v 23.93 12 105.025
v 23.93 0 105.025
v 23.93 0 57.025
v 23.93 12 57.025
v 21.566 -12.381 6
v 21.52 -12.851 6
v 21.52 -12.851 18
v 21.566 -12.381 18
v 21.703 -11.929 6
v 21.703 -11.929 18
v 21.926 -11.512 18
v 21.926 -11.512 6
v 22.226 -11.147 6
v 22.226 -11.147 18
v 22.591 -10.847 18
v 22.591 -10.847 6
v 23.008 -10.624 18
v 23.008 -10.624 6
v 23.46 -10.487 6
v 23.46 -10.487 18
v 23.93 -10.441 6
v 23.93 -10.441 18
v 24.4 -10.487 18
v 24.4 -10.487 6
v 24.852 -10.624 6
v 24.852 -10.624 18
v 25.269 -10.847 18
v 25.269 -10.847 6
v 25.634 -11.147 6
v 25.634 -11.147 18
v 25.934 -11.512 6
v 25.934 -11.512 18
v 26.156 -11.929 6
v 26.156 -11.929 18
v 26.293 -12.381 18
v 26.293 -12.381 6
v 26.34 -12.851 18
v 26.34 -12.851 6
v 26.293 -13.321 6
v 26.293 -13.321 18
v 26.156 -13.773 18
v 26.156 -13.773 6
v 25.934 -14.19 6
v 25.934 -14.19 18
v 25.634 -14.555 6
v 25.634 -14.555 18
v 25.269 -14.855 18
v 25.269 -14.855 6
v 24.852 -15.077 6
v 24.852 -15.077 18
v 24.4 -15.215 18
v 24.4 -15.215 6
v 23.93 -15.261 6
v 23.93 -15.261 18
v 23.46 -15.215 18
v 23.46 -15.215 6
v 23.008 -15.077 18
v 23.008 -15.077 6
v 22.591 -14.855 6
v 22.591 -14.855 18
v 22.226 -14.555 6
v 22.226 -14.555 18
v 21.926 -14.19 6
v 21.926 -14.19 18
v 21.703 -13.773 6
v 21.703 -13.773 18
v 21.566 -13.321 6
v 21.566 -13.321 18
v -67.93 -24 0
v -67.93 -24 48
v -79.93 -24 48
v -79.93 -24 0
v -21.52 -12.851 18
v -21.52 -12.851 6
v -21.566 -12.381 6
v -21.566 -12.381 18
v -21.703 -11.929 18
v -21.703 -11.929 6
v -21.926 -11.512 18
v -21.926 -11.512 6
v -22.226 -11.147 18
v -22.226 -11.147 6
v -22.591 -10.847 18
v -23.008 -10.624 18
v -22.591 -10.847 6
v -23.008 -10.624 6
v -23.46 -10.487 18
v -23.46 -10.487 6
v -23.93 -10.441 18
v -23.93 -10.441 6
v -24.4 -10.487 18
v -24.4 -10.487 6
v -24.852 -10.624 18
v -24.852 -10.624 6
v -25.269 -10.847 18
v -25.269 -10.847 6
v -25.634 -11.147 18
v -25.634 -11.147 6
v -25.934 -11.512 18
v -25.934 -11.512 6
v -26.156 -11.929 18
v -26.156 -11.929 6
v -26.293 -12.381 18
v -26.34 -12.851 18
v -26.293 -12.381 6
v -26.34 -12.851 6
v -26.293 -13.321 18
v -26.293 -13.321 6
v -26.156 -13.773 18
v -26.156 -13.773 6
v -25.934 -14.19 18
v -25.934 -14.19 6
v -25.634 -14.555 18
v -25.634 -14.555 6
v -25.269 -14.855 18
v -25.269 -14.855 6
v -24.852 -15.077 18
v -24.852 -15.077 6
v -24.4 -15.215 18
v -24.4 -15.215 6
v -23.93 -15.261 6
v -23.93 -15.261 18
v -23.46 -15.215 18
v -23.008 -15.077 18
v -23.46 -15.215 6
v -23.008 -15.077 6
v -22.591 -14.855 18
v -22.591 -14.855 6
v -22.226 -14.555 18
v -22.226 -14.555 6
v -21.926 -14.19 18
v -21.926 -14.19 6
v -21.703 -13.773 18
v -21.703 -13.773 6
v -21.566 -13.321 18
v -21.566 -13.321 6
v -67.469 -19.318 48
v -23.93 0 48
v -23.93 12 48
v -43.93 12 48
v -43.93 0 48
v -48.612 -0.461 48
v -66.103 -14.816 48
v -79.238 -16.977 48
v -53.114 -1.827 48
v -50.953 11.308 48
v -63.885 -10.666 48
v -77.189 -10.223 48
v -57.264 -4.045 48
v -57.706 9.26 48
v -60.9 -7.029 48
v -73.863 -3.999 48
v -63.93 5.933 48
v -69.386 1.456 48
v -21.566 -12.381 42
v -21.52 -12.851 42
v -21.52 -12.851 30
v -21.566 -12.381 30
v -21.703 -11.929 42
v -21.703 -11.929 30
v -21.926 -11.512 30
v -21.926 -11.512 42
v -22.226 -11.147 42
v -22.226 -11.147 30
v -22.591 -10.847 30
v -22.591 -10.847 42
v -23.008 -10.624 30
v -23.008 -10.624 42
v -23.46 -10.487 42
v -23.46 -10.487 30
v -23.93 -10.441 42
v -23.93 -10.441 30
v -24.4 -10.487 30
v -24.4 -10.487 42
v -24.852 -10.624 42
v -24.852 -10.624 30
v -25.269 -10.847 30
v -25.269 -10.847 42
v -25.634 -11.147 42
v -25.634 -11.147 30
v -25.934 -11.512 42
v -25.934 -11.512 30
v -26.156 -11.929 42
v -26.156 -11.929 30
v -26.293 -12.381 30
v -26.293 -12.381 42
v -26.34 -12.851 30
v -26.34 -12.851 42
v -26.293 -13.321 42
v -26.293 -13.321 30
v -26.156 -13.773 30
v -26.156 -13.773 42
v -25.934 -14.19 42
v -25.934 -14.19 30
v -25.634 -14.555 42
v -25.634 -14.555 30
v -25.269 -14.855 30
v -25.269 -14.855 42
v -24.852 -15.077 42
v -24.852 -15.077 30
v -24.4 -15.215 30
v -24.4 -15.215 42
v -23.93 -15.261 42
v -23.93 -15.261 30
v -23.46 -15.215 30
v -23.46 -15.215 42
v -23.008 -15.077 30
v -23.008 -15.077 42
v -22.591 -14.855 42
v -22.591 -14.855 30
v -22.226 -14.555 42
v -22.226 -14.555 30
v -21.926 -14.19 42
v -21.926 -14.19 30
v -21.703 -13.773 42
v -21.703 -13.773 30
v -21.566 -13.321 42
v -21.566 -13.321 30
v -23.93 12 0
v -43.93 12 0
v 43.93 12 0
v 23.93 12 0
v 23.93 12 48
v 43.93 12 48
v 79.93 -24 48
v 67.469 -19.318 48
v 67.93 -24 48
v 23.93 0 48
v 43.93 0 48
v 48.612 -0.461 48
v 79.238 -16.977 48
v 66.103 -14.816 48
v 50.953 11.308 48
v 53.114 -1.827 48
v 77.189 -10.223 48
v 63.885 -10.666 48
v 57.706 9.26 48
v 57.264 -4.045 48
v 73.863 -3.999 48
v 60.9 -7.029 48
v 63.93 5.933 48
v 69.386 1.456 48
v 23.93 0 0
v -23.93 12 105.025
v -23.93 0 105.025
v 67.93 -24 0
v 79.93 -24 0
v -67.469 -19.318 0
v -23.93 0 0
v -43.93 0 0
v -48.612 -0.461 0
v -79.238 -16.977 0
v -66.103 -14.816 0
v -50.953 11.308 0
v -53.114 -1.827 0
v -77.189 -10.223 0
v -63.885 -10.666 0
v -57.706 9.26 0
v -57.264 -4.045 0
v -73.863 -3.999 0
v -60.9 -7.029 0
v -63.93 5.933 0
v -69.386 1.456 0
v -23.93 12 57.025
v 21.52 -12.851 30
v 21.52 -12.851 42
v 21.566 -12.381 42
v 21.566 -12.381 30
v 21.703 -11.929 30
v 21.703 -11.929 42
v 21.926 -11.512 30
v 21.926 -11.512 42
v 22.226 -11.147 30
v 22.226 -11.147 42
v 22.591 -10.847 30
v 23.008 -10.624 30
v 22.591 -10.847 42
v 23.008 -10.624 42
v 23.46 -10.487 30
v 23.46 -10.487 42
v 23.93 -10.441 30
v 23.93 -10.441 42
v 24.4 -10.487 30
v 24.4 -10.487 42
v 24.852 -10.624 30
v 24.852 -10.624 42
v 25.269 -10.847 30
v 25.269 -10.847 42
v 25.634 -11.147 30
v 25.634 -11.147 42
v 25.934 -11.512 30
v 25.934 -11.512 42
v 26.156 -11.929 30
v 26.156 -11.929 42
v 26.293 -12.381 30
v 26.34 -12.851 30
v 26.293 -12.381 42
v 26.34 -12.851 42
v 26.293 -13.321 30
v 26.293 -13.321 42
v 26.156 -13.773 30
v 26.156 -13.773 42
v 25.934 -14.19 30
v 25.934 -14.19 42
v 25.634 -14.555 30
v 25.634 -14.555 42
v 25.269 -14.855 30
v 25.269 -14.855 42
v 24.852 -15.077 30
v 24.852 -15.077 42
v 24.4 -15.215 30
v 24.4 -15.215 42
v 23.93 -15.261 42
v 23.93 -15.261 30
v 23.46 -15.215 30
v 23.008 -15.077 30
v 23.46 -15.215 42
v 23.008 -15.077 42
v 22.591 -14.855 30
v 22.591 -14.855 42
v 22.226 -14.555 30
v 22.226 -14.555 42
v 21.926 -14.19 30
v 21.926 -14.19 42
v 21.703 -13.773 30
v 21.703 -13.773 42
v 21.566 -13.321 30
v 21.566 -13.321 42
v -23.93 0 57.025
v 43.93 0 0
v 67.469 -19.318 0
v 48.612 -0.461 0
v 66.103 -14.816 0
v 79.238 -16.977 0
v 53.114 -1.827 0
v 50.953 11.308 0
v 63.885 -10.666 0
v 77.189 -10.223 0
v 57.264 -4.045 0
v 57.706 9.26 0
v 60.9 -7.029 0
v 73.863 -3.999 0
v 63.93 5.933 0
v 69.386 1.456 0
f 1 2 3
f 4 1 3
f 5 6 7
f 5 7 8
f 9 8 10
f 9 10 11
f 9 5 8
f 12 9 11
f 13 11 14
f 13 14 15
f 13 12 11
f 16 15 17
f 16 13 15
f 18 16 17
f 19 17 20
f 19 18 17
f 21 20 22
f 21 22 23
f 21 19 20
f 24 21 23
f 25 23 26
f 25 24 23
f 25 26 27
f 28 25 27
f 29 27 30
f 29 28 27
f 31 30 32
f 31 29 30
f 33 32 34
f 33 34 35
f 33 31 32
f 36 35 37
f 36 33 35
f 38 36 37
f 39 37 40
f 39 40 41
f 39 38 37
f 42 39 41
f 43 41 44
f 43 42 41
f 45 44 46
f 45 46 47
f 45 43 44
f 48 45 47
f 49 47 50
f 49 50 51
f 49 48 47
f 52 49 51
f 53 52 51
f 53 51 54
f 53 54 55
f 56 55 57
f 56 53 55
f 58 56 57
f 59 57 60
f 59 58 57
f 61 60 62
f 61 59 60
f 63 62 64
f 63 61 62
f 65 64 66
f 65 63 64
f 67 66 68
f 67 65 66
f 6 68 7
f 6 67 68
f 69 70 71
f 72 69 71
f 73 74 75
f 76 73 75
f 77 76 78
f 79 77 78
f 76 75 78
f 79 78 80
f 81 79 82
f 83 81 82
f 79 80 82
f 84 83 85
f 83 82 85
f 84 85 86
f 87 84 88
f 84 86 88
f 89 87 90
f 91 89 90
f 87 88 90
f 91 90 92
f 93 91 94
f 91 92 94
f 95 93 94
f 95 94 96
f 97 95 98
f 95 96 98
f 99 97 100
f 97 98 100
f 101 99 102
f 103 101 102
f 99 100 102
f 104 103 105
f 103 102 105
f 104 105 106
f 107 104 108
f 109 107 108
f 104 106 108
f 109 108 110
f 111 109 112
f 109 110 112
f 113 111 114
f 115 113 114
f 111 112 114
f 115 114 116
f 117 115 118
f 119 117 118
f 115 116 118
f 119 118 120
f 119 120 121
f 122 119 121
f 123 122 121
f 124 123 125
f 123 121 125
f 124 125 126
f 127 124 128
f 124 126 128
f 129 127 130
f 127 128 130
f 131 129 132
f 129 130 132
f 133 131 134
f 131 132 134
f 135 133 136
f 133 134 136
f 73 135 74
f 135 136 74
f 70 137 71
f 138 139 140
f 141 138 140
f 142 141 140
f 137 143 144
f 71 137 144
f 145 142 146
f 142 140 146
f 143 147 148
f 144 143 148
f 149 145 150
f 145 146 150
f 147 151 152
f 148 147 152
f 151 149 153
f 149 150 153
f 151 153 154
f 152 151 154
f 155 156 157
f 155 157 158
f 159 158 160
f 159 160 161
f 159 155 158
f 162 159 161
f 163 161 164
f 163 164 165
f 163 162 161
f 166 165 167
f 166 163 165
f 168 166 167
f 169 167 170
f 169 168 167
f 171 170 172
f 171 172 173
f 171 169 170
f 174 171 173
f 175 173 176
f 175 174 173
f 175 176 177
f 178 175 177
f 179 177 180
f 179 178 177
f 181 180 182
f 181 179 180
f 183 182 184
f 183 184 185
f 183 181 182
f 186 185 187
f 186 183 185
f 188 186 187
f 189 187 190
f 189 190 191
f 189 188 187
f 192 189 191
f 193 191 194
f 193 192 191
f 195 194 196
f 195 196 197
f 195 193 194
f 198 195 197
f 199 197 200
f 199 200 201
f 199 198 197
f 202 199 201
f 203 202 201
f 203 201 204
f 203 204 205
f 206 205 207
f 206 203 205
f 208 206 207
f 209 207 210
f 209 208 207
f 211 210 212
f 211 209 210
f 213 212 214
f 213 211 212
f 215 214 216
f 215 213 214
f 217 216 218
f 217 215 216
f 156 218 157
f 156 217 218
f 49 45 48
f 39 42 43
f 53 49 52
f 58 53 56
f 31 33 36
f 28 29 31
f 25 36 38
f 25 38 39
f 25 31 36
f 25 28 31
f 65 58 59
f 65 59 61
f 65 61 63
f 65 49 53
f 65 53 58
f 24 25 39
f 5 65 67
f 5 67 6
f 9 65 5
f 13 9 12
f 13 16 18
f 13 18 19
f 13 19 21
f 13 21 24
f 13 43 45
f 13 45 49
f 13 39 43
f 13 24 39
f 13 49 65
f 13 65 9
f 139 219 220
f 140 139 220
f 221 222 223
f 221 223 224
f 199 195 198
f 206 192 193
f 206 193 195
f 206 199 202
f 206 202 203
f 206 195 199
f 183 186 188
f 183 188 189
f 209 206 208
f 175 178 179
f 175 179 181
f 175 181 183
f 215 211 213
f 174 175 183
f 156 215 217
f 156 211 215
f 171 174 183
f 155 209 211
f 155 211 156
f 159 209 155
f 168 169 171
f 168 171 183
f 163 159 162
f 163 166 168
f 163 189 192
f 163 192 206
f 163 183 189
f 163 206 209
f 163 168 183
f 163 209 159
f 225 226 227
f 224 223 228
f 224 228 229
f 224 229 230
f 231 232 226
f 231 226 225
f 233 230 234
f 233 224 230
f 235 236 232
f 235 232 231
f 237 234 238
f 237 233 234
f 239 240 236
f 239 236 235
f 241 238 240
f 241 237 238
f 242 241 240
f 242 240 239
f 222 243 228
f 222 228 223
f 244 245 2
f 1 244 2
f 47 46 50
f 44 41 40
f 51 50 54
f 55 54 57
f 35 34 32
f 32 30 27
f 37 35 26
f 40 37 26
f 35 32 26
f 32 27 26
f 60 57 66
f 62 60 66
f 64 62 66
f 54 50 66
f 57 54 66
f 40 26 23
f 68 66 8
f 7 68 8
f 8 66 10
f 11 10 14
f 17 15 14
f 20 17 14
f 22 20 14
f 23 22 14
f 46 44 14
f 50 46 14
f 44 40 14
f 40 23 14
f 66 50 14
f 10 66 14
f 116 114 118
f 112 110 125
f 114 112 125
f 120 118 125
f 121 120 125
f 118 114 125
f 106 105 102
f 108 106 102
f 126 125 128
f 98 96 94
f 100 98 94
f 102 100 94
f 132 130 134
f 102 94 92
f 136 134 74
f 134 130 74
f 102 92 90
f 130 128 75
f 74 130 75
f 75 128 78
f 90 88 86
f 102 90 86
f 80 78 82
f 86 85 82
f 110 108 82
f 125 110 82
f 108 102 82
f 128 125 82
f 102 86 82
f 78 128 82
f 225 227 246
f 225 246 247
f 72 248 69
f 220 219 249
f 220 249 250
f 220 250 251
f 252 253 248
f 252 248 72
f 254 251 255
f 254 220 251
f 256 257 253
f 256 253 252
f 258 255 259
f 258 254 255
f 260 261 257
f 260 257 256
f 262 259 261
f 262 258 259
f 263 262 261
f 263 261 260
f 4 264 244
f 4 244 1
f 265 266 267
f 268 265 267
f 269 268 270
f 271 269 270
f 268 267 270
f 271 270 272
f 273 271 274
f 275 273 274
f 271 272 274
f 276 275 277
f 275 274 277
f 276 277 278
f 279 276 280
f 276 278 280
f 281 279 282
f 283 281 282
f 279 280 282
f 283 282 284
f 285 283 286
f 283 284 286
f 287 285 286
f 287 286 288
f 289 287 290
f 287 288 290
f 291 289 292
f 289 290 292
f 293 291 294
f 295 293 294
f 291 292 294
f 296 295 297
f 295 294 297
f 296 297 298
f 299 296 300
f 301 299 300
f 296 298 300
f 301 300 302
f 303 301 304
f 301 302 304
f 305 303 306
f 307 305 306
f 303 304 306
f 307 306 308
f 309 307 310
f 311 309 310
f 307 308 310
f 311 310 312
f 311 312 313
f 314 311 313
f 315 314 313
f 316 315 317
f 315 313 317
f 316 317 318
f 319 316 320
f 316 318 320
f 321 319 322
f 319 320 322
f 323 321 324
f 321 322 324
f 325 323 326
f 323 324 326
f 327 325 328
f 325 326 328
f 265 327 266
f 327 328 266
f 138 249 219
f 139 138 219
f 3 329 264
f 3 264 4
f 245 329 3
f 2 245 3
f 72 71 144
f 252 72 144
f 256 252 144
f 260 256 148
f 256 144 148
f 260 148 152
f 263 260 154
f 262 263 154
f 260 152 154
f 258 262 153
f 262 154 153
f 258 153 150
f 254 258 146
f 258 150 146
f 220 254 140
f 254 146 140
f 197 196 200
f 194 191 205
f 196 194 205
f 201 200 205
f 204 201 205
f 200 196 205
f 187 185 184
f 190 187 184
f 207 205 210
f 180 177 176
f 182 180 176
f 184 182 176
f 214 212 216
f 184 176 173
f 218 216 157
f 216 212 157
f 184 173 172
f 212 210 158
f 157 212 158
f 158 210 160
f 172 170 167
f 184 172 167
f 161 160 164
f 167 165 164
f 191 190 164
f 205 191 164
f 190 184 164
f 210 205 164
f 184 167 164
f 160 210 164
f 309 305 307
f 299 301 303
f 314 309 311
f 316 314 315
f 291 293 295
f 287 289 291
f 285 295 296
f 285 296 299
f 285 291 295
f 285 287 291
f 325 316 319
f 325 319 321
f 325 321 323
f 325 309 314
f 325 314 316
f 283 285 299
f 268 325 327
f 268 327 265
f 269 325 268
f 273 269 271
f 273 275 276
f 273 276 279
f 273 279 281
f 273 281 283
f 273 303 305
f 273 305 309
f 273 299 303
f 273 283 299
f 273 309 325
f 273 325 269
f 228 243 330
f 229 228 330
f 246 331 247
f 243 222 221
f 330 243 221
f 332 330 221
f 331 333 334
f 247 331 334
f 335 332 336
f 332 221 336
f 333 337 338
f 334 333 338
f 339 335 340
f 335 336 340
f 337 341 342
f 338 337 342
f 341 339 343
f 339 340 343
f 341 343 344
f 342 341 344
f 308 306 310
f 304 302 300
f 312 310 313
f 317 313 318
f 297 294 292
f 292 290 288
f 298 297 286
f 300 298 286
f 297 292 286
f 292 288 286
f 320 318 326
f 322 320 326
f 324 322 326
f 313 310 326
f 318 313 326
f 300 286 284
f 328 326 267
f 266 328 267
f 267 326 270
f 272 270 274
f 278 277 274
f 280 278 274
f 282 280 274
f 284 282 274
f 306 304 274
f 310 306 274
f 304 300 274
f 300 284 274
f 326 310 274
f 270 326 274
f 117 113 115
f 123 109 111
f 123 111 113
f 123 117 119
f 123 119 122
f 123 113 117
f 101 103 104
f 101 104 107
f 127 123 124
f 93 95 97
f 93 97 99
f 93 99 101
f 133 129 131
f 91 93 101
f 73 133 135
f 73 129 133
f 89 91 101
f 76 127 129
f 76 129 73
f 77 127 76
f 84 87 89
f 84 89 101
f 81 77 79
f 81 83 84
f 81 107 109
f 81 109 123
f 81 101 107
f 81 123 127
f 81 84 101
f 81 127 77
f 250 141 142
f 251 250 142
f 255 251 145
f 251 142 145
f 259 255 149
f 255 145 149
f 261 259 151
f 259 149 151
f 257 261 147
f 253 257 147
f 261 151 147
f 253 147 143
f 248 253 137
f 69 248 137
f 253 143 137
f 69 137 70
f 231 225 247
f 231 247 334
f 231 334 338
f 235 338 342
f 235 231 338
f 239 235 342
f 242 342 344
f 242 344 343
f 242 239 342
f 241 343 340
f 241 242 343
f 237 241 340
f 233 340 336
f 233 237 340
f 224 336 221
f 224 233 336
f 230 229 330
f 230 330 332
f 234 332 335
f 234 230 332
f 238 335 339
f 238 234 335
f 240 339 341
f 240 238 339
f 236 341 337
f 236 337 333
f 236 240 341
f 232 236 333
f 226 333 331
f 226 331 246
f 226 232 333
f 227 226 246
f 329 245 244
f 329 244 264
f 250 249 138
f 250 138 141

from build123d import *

# Parameters (mm, degrees)
SKETCH_2_W      = 20
SKETCH_2_H      = 12
EXTRUDE_2_DEPTH = 48
EXTRUDE_4_DEPTH = 48
SKETCH_13_W     = 47.859649122
SKETCH_13_H     = 48
EXTRUDE_5_DEPTH = 12
EXTRUDE_START   = 6
SKETCH_15_R     = 2.409896086
EXTRUDE_6_DEPTH = 12


with BuildPart() as part:
    # 草图2 → 凸台-拉伸2 (new body)
    with BuildSketch(Plane.XY):
        with Locations((33.929824561, 6)):
            Rectangle(SKETCH_2_W, SKETCH_2_H)
    extrude(amount=EXTRUDE_2_DEPTH)

    # 草图9 → 凸台-拉伸4 (add)
    with BuildSketch(Plane.XY.offset(48)):
        with BuildLine():
            Line((67.929824561, -24), (79.929824561, -24))
            ThreePointArc((79.929824561, -24), (69.385668684, 1.455844123), (43.929824561, 12))
            Line((43.929824561, 12), (43.929824561, 0))
            ThreePointArc((43.929824561, 0), (60.90038731, -7.029437252), (67.929824561, -24))
        make_face()
    extrude(amount=-EXTRUDE_4_DEPTH)


with BuildPart() as body_2:
    # 镜向10: mirrored copy
    add(part.part.mirror(Plane(origin=(0, 0, 0), x_dir=(0, 0, 1), z_dir=(1, 0, 0))))


with BuildPart() as body_3:
    # 草图13 → 凸台-拉伸5 (new body)
    with BuildSketch(Plane(origin=(0, 0, 0), x_dir=(1, 0, 0), z_dir=(0, 1, 0))):
        with Locations((0, -81.024626709)):
            Rectangle(SKETCH_13_W, SKETCH_13_H)
    extrude(amount=EXTRUDE_5_DEPTH)


with BuildPart() as body_4:
    # 草图15 → 凸台-拉伸6 (new body)
    with BuildSketch(Plane.XY.offset(EXTRUDE_START)):
        with Locations((-23.929824561, -12.850945387)):
            Circle(SKETCH_15_R)
    extrude(amount=EXTRUDE_6_DEPTH)


with BuildPart() as body_5:
    # 镜向11: mirrored copy
    add(body_4.part.mirror(Plane.XY.offset(24)))


with BuildPart() as body_6:
    # 镜向13: mirrored copy
    add(body_4.part.mirror(Plane(origin=(0, 0, 0), x_dir=(0, 0, 1), z_dir=(1, 0, 0))))


with BuildPart() as body_7:
    # Mirror 13 2: mirrored copy
    add(body_5.part.mirror(Plane(origin=(0, 0, 0), x_dir=(0, 0, 1), z_dir=(1, 0, 0))))


solid = Compound([part.part, body_2.part, body_3.part, body_4.part, body_5.part, body_6.part, body_7.part])
